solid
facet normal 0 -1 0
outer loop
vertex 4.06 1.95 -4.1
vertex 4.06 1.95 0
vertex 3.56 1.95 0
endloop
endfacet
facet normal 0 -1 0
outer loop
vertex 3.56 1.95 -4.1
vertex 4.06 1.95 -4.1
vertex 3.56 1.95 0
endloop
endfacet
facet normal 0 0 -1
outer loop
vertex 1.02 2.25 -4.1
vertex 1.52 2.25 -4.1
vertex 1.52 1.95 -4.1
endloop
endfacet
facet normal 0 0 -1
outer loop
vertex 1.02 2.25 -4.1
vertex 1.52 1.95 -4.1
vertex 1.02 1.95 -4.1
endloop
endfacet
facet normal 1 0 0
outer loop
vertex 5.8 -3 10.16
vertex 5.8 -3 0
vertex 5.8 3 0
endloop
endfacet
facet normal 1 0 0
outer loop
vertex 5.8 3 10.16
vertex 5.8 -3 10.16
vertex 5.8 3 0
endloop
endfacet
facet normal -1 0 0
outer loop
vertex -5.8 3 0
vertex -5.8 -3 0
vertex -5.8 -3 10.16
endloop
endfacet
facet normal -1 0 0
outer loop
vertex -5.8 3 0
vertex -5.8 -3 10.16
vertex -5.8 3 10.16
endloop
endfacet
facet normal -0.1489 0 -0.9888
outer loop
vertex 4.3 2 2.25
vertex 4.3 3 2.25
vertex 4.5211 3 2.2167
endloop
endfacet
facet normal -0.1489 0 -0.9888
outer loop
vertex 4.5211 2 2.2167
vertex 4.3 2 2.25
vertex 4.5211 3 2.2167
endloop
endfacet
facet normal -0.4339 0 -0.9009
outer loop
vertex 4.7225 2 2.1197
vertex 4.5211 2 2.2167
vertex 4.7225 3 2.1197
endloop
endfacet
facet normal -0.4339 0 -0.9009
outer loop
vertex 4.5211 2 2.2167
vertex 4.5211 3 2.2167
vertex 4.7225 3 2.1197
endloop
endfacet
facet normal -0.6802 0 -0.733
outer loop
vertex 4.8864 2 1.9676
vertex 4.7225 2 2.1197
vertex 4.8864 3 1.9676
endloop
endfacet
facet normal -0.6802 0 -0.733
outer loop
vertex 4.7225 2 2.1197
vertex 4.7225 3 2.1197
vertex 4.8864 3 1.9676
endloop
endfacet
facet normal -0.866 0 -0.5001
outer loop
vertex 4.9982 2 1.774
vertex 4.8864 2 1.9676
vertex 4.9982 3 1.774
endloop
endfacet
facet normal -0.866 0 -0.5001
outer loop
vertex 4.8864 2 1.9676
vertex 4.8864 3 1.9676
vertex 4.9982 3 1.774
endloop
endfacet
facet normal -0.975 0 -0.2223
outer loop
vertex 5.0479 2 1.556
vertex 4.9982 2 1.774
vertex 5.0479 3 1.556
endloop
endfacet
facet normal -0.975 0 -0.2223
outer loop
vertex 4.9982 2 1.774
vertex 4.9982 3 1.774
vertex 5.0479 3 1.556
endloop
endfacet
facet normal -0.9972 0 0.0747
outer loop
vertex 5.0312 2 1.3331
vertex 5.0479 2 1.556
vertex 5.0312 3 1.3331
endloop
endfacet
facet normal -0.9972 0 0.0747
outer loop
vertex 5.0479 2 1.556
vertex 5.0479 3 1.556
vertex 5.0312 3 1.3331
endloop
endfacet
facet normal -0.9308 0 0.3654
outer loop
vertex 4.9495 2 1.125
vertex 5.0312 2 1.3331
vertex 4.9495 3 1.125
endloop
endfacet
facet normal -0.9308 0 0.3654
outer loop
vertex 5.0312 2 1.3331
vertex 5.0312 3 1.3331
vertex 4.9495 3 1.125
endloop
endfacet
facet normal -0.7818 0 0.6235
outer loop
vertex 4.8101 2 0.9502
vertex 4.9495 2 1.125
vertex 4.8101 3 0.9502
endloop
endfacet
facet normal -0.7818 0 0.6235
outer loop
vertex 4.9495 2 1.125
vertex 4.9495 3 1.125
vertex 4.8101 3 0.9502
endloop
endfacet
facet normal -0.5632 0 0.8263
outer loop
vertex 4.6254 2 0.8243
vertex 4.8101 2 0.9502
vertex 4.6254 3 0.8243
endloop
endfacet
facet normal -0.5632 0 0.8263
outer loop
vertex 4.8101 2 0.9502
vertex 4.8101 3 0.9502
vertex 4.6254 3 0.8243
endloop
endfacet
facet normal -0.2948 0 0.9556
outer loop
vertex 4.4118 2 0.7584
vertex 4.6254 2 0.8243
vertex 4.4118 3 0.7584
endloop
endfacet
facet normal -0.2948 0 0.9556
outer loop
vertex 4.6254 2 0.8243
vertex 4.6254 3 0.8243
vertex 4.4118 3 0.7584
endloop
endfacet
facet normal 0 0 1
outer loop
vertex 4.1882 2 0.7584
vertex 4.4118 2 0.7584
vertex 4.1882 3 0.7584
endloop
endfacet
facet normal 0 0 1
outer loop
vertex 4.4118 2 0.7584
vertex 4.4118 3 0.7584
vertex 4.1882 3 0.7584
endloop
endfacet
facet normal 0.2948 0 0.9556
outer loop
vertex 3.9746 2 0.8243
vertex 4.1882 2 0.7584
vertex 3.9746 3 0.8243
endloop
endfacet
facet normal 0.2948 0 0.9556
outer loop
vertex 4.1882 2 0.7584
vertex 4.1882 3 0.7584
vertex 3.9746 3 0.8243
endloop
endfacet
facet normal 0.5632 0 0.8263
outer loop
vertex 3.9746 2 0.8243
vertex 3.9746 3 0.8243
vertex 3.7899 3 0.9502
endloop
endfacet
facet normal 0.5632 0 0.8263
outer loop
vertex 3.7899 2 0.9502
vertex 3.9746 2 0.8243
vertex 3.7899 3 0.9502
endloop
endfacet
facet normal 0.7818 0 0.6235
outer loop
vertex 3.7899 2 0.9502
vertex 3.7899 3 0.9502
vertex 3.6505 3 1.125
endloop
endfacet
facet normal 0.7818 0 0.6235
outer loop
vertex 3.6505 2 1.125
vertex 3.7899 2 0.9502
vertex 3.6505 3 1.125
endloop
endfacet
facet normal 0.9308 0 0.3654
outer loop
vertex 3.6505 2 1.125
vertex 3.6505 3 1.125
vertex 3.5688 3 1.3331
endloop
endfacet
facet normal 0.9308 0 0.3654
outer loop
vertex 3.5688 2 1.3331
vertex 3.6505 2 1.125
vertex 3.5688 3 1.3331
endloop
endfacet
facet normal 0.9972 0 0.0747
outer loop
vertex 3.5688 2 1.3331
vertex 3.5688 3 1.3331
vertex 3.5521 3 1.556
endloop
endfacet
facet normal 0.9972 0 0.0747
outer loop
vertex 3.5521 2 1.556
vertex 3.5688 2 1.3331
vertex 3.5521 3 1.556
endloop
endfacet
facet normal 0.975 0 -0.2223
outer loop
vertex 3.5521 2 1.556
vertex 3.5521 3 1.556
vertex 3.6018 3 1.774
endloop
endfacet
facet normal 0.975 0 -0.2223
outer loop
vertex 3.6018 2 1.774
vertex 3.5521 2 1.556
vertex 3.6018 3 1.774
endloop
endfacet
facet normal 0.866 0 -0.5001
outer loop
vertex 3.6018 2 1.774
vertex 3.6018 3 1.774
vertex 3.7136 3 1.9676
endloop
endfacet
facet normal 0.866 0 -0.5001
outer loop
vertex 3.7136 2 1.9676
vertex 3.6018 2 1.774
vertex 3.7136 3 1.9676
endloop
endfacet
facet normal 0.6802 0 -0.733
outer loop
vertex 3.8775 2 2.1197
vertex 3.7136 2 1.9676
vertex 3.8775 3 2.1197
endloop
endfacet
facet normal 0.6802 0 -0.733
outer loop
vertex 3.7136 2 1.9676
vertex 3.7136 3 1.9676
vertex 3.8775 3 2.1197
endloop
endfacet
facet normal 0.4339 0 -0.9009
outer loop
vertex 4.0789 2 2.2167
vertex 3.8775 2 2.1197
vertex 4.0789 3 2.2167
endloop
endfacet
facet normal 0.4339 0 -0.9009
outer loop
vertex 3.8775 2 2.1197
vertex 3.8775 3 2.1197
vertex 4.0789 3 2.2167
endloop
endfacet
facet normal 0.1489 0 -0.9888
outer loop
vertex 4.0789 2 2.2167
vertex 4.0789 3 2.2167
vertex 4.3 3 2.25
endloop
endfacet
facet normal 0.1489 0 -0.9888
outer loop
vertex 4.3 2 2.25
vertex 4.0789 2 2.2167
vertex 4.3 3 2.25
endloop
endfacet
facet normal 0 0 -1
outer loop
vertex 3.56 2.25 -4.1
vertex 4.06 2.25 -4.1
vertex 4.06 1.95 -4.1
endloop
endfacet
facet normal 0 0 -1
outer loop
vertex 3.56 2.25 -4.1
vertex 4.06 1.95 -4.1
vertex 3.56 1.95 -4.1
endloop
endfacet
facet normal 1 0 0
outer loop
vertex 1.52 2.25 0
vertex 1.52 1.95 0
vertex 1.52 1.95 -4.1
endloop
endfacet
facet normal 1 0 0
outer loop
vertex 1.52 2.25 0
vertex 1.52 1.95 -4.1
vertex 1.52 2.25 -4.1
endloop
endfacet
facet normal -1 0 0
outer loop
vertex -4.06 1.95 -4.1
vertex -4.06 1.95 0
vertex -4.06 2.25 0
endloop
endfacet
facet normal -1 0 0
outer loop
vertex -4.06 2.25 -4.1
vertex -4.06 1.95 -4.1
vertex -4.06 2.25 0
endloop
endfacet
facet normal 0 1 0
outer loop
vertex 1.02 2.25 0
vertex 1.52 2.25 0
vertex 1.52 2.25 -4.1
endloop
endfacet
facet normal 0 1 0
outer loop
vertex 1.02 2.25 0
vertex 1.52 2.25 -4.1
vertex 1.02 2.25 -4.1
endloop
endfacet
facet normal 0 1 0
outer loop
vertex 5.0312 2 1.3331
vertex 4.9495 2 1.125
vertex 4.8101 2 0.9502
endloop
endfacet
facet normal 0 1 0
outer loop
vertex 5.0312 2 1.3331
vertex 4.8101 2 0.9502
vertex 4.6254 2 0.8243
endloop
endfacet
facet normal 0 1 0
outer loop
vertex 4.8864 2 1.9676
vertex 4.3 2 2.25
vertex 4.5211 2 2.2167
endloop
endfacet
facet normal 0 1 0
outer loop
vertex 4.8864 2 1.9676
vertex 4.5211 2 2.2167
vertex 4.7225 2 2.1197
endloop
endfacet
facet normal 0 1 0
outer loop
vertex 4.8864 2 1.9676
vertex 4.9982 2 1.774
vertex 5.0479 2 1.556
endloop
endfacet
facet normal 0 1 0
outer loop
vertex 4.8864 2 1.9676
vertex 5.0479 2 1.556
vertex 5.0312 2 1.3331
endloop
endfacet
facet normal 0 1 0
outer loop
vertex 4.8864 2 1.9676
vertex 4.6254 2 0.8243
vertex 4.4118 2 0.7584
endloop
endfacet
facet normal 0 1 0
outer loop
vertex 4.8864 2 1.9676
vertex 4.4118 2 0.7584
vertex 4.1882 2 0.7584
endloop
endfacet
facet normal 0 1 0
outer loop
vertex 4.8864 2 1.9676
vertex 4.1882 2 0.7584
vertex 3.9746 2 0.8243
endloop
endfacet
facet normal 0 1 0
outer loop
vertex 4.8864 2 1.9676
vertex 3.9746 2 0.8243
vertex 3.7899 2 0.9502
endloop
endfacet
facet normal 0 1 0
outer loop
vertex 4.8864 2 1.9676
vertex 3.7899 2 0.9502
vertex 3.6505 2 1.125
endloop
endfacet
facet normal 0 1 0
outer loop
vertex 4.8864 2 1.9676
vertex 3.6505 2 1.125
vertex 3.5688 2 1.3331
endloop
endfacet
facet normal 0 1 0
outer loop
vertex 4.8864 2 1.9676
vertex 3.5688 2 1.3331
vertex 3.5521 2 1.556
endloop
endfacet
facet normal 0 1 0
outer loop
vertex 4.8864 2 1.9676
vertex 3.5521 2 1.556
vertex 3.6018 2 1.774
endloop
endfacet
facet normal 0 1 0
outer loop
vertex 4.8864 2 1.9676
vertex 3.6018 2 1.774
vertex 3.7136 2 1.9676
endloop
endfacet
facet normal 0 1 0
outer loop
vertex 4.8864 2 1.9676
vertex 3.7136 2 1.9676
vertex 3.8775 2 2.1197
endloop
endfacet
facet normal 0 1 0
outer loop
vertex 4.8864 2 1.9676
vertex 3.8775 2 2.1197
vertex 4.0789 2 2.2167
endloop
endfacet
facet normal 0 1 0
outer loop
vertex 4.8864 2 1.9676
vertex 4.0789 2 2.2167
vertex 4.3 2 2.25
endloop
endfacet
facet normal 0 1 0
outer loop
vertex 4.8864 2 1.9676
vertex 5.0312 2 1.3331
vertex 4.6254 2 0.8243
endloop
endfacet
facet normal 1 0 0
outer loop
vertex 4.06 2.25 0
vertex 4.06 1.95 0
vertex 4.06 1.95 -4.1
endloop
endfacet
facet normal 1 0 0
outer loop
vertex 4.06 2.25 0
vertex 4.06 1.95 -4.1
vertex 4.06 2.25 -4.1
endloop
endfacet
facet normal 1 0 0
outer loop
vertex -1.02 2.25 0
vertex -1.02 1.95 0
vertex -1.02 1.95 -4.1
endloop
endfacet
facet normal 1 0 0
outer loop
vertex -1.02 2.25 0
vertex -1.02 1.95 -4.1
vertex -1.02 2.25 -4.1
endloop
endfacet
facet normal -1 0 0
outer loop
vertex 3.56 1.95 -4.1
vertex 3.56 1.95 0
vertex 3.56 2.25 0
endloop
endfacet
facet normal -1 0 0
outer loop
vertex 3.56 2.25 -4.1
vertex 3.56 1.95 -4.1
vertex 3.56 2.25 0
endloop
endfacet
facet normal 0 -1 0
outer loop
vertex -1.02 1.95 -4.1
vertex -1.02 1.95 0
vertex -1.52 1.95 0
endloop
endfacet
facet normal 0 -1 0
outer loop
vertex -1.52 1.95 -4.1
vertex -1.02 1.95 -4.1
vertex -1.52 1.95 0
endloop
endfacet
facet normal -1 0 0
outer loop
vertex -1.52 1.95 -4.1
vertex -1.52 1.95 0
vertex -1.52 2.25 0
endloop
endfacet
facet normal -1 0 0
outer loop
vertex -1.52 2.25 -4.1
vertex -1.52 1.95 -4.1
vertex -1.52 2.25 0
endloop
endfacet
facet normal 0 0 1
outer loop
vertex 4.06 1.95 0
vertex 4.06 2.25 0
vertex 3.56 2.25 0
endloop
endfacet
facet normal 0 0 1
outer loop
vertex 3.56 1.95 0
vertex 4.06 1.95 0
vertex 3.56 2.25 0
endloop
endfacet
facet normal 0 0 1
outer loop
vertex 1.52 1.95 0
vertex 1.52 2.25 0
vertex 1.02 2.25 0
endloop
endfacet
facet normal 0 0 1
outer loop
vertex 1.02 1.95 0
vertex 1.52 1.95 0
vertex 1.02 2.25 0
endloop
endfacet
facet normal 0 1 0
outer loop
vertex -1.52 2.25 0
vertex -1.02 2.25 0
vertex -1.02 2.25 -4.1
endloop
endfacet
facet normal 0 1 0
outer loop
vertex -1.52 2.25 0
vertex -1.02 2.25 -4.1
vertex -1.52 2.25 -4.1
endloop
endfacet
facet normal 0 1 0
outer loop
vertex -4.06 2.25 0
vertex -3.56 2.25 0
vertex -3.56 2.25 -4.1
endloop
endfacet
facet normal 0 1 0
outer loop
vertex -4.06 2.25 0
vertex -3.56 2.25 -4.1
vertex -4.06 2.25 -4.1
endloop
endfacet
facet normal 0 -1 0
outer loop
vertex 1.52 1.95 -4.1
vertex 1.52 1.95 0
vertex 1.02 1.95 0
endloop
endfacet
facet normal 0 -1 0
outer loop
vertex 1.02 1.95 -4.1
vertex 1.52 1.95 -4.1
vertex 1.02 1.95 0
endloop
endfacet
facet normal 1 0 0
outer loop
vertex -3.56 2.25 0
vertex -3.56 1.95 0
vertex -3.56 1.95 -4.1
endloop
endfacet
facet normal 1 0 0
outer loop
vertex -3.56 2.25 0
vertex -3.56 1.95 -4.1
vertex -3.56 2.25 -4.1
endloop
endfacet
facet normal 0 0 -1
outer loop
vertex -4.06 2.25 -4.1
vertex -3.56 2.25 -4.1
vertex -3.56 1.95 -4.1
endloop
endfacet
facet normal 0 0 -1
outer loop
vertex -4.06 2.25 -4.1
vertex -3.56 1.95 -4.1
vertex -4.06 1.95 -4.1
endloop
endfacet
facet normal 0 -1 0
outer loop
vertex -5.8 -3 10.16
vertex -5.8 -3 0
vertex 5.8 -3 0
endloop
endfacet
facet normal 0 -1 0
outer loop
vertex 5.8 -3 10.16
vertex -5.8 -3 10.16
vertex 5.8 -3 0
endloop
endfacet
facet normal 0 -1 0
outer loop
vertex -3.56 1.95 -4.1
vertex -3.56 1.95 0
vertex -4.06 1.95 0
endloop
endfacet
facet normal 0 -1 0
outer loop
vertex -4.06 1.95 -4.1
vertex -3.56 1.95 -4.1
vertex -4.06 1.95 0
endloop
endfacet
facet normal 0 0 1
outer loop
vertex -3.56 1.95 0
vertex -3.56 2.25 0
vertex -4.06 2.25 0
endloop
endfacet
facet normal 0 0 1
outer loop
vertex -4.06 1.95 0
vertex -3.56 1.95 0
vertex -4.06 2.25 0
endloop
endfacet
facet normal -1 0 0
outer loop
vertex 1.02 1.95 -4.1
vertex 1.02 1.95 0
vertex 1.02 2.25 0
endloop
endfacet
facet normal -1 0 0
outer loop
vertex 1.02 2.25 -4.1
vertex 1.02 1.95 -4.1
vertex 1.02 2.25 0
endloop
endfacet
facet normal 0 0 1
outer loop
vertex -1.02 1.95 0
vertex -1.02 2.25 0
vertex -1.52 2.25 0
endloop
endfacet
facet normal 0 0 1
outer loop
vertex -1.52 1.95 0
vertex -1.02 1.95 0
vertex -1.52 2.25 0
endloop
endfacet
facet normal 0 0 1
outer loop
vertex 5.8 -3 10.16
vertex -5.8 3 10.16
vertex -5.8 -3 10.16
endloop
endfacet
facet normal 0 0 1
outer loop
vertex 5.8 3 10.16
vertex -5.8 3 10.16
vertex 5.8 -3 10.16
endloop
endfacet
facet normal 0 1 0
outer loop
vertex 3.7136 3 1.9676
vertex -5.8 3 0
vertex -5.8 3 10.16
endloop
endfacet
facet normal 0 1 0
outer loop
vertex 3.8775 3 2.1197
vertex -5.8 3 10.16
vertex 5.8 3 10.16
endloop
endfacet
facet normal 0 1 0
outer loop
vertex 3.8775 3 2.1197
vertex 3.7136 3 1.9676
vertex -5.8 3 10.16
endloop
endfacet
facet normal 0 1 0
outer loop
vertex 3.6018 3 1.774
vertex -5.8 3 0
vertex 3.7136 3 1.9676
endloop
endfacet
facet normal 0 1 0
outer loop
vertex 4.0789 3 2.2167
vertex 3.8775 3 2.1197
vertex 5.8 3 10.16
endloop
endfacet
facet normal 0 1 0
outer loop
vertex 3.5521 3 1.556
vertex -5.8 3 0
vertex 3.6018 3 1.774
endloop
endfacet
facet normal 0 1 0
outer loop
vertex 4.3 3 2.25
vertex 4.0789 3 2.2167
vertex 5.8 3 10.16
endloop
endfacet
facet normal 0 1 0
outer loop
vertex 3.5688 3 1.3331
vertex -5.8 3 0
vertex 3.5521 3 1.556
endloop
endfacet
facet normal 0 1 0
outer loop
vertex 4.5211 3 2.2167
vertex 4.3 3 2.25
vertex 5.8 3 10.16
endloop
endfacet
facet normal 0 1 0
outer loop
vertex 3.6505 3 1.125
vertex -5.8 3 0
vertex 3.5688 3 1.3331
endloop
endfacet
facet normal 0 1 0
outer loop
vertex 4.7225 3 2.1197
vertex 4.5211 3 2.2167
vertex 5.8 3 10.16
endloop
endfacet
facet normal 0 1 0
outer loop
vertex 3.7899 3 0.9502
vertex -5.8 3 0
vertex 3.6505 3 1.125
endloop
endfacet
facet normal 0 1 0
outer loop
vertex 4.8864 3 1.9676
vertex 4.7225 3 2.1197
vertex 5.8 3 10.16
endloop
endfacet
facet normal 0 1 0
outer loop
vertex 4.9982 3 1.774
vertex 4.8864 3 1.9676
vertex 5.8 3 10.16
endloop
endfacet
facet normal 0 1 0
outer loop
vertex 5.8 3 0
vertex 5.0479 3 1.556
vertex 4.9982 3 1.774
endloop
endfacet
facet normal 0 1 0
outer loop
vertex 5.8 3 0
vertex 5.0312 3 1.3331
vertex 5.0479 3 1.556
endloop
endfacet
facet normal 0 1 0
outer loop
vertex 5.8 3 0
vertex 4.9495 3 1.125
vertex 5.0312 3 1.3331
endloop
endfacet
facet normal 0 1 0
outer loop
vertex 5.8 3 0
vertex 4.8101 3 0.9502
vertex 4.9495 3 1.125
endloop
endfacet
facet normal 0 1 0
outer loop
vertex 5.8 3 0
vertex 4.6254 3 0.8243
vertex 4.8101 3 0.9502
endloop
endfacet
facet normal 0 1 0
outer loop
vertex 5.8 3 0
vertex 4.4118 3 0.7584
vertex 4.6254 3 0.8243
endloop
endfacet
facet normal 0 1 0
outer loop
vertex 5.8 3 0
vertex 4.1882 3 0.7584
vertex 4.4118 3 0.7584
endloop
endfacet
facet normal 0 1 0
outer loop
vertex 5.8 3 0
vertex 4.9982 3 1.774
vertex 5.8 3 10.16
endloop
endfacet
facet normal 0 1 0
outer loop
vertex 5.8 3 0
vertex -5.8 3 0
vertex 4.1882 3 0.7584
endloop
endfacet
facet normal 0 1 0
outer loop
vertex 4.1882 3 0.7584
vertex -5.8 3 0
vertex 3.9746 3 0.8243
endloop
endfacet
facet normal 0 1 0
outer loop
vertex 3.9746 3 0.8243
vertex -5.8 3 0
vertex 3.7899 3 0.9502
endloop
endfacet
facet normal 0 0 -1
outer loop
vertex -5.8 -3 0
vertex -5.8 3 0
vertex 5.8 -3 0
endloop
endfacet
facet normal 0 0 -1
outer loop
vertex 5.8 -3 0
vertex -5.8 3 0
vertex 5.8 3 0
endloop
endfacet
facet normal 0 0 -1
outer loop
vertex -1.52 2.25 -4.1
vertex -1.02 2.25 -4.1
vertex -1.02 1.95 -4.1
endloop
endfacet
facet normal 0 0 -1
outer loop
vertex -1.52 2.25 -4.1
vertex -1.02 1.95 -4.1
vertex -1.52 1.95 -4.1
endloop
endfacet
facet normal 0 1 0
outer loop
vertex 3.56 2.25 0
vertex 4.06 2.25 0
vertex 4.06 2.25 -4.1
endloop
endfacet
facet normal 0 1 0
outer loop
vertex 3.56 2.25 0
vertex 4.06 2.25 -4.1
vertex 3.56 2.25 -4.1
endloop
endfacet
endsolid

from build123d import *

# Parameters (mm, degrees)
SKETCH_1_W          = 11.6
SKETCH_1_H          = 6
EXTRUDE_1_DEPTH     = 10.16
SKETCH_2_W          = 0.5
SKETCH_2_H          = 0.3
EXTRUDE_2_DEPTH     = 4.1
EXTRUDE_2_2_DEPTH   = 4.1
EXTRUDE_2_3_DEPTH   = 4.1
EXTRUDE_2_4_DEPTH   = 4.1
SKETCH_3_R          = 0.75
CUT_EXTRUDE_1_DEPTH = 1


with BuildPart() as part:
    # 草图1 → 凸台-拉伸1 (new body)
    with BuildSketch(Plane.XY):
        Rectangle(SKETCH_1_W, SKETCH_1_H)
    extrude(amount=EXTRUDE_1_DEPTH)

    # 草图3 → 切除-拉伸1 (cut)
    with BuildSketch(Plane(origin=(0, 3, 0), x_dir=(1, 0, 0), z_dir=(0, 1, 0))):
        with Locations(Location((4.3, -1.5, 0), (0, 0, 270))):
            Circle(SKETCH_3_R)
    extrude(amount=-CUT_EXTRUDE_1_DEPTH, mode=Mode.SUBTRACT)


with BuildPart() as body_2:
    # 草图2 → 凸台-拉伸2 (new body)
    with BuildSketch(Plane(origin=(0, 0, 0), x_dir=(-1, 0, 0), z_dir=(0, 0, -1))):
        with Locations((-1.27, 2.1)):
            Rectangle(SKETCH_2_W, SKETCH_2_H)
    extrude(amount=EXTRUDE_2_DEPTH)


with BuildPart() as body_3:
    # 草图2 → Extrude 2 2 (new body)
    with BuildSketch(Plane(origin=(0, 0, 0), x_dir=(-1, 0, 0), z_dir=(0, 0, -1))):
        with Locations((-3.81, 2.1)):
            Rectangle(SKETCH_2_W, SKETCH_2_H)
    extrude(amount=EXTRUDE_2_2_DEPTH)


with BuildPart() as body_4:
    # 草图2 → Extrude 2 3 (new body)
    with BuildSketch(Plane(origin=(0, 0, 0), x_dir=(-1, 0, 0), z_dir=(0, 0, -1))):
        with Locations((1.27, 2.1)):
            Rectangle(SKETCH_2_W, SKETCH_2_H)
    extrude(amount=EXTRUDE_2_3_DEPTH)


with BuildPart() as body_5:
    # 草图2 → Extrude 2 4 (new body)
    with BuildSketch(Plane(origin=(0, 0, 0), x_dir=(-1, 0, 0), z_dir=(0, 0, -1))):
        with Locations((3.81, 2.1)):
            Rectangle(SKETCH_2_W, SKETCH_2_H)
    extrude(amount=EXTRUDE_2_4_DEPTH)


solid = Compound([part.part, body_2.part, body_3.part, body_4.part, body_5.part])
